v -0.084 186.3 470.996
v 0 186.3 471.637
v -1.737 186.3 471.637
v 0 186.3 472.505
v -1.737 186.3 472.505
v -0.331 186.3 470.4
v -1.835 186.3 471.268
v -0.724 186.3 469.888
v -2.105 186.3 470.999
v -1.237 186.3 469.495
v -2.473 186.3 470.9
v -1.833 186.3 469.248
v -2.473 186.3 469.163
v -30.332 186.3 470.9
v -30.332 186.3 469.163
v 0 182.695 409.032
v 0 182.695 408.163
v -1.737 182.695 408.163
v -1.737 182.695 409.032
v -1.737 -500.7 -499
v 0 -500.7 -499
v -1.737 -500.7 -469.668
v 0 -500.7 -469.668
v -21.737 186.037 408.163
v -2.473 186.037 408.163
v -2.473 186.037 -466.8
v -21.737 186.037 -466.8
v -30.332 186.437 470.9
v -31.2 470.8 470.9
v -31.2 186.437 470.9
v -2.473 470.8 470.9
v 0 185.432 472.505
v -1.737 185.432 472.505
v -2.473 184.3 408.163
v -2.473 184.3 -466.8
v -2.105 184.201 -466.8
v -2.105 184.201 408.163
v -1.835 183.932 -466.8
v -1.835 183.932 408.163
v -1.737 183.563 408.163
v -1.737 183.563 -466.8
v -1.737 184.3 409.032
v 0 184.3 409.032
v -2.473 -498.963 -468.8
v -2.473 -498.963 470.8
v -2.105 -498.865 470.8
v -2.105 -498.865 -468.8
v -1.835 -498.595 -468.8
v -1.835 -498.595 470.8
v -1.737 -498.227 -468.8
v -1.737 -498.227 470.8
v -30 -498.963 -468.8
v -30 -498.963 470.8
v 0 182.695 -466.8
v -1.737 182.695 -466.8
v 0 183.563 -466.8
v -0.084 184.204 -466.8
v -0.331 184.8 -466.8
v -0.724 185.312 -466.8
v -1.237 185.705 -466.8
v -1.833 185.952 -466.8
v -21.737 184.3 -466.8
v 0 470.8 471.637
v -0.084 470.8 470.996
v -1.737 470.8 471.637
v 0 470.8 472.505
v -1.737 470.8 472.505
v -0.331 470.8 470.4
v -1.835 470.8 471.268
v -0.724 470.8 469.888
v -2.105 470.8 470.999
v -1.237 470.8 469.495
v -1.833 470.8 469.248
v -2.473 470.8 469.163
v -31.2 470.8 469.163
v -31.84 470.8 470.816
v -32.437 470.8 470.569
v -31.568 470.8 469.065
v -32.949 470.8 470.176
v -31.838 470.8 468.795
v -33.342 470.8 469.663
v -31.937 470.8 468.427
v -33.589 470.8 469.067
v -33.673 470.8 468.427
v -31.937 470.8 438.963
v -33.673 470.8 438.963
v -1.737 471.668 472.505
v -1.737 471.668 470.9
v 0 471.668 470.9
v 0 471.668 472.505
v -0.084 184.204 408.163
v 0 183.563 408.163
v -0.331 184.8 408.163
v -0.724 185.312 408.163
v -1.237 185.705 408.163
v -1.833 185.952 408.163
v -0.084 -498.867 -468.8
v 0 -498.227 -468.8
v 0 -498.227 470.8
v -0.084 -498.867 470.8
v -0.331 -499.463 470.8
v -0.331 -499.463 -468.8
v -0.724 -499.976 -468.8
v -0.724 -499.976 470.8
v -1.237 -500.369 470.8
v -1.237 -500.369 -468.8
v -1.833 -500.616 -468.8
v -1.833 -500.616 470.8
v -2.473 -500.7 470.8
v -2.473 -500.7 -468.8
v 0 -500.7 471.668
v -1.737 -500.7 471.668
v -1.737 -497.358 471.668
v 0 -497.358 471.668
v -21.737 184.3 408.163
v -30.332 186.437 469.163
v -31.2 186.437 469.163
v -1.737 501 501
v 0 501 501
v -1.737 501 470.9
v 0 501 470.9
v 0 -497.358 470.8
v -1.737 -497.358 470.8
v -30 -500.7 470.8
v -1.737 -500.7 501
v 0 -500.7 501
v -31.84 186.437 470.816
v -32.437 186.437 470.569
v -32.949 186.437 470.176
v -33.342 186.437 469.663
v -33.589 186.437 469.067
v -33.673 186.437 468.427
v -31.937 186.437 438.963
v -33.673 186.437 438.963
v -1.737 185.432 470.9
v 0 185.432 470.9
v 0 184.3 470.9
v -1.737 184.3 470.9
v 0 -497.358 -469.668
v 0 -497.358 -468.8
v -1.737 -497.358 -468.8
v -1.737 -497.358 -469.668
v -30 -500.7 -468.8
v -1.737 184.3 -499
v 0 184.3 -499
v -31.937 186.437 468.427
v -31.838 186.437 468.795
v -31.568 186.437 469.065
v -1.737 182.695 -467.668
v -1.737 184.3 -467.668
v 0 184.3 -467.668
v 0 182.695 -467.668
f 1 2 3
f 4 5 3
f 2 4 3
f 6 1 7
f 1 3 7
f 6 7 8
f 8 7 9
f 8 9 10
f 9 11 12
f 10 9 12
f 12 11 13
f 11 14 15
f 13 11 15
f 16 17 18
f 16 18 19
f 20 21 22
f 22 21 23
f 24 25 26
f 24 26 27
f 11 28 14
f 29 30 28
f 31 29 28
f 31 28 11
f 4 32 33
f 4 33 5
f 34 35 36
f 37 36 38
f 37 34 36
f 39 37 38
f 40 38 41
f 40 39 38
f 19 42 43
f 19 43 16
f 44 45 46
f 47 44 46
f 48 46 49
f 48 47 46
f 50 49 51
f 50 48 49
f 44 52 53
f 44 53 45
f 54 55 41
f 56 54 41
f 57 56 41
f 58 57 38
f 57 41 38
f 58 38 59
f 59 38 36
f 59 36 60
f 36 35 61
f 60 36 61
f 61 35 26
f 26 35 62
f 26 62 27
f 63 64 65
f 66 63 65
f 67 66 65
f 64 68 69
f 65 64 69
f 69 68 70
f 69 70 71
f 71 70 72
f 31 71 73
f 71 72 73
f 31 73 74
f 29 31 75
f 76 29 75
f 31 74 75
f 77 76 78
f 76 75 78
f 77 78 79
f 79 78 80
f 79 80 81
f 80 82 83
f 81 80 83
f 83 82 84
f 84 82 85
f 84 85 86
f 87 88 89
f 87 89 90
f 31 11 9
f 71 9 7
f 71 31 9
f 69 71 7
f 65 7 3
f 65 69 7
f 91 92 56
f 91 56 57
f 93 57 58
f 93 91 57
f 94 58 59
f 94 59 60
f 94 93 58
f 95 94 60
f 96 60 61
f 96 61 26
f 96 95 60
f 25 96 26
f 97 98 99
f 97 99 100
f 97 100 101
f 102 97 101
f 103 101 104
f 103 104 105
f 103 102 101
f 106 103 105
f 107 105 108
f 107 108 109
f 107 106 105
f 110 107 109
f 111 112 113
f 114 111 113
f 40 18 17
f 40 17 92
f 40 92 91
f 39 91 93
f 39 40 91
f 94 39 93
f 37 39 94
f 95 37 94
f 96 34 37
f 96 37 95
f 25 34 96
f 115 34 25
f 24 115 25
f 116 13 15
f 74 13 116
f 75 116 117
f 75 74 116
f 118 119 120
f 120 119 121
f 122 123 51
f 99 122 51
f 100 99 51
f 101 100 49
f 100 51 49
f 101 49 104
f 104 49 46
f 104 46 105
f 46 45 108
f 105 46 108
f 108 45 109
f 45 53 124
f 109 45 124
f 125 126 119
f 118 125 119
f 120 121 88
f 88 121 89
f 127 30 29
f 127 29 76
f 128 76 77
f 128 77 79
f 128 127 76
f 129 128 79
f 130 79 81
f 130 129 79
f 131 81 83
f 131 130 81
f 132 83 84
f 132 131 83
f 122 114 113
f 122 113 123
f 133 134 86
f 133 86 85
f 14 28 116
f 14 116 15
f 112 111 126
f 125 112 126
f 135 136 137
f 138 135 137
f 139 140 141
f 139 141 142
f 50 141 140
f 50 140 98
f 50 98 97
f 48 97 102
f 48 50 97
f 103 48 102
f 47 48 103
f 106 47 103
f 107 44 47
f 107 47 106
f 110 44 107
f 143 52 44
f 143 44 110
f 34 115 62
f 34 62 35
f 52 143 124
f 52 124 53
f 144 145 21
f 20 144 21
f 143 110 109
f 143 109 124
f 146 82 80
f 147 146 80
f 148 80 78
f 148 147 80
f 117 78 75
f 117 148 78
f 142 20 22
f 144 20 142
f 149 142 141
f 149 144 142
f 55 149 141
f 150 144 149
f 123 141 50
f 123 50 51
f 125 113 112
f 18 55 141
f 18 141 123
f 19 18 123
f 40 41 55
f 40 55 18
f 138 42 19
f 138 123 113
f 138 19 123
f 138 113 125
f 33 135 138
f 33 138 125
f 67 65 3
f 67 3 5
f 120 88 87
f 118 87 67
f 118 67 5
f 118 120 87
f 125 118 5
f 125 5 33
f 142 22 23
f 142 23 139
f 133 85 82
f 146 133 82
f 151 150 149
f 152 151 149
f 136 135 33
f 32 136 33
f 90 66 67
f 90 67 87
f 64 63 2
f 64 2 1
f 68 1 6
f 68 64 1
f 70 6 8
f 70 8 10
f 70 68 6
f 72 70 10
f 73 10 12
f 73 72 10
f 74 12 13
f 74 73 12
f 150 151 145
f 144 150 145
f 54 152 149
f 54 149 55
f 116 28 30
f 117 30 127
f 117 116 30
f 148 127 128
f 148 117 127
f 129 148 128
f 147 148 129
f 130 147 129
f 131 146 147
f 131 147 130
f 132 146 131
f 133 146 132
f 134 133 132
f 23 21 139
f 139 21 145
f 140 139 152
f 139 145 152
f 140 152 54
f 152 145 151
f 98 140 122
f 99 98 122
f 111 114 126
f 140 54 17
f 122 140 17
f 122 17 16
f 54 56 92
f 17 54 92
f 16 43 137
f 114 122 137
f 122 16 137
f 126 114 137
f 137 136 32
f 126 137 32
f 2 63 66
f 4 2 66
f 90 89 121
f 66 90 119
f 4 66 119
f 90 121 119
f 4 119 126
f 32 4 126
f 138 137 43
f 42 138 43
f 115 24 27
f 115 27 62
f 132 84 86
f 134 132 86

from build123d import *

# Parameters (mm, degrees)
BASE_FLANGE2_DEPTH            = 1.7366
EDGE_FLANGE5_STRIP_W          = 8.4196
EDGE_FLANGE5_STRIP_H          = 1.7366
EDGE_FLANGE5_STRIP_CUT_DEPTH  = 939.6
EDGE_FLANGE5_RELIEF_W         = 9.2879
EDGE_FLANGE5_RELIEF_H         = 0.8683
EDGE_FLANGE5_RELIEF_CUT_DEPTH = 1.7366
EDGE_FLANGE5_DEPTH            = 939.6
EDGE_FLANGE6_STRIP_W          = 8.4196
EDGE_FLANGE6_STRIP_H          = 1.7366
EDGE_FLANGE6_STRIP_CUT_DEPTH  = 284.5
EDGE_FLANGE6_RELIEF_W         = 9.2879
EDGE_FLANGE6_RELIEF_H         = 0.8683
EDGE_FLANGE6_RELIEF_CUT_DEPTH = 1.7366
EDGE_FLANGE6_DEPTH            = 284.5
EDGE_FLANGE8_STRIP_W          = 8.4196
EDGE_FLANGE8_STRIP_H          = 1.7366
EDGE_FLANGE8_STRIP_CUT_DEPTH  = 874.9634
EDGE_FLANGE8_RELIEF_W         = 9.2879
EDGE_FLANGE8_RELIEF_H         = 0.8683
EDGE_FLANGE8_RELIEF_CUT_DEPTH = 1.7366
EDGE_FLANGE8_DEPTH            = 874.9634
EDGE_FLANGE9_STRIP_W          = 8.4196
EDGE_FLANGE9_STRIP_H          = 1.7366
EDGE_FLANGE9_STRIP_CUT_DEPTH  = 284.3634
EDGE_FLANGE9_RELIEF_W         = 9.2879
EDGE_FLANGE9_RELIEF_H         = 0.8683
EDGE_FLANGE9_RELIEF_CUT_DEPTH = 1.7366
EDGE_FLANGE9_DEPTH            = 284.3634


# Sheet-metal steps are written as plain solids
with BuildPart() as part:
    # Sketch10 → Base-Flange2 (new body)
    with BuildSketch(Plane(origin=(0, 0, 0), x_dir=(0, 0, -1), z_dir=(1, 0, 0))):
        Polygon((-470.9, 501), (-470.9, 184.3), (499, 184.3), (499, -500.7), (-501, -500.7), (-501, 501), align=None)
    extrude(amount=-BASE_FLANGE2_DEPTH)

    # Edge-Flange5 strip (across the edge) → Edge-Flange5 strip cut (cut)
    with BuildSketch(Plane(origin=(-1.7366, -500.7, -468.8), x_dir=(0, 1, 0), z_dir=(0, 0, 1))):
        with Locations((-1.7366, -0.8683)):
            Rectangle(EDGE_FLANGE5_STRIP_W, EDGE_FLANGE5_STRIP_H)
    extrude(amount=EDGE_FLANGE5_STRIP_CUT_DEPTH, mode=Mode.SUBTRACT)

    # Edge-Flange5 relief (on the sheet) → Edge-Flange5 relief cut (cut)
    with BuildSketch(Plane(origin=(-1.7366, -498.2268, -468.8), x_dir=(0, 1, 0), z_dir=(-1, 0, 0))):
        with Locations((-3.77565, 0.43415)):
            Rectangle(EDGE_FLANGE5_RELIEF_W, EDGE_FLANGE5_RELIEF_H)
        with Locations((-3.77565, -940.03415)):
            Rectangle(EDGE_FLANGE5_RELIEF_W, EDGE_FLANGE5_RELIEF_H)
    extrude(amount=-EDGE_FLANGE5_RELIEF_CUT_DEPTH, mode=Mode.SUBTRACT)

    # Edge-Flange5 section (across the edge) → Edge-Flange5 (add)
    with BuildSketch(Plane(origin=(-1.7366, -500.7, -468.8), x_dir=(0, 1, 0), z_dir=(0, 0, 1))):
        with BuildLine():
            Line((0, 0.7366), (0, 28.2634))
            Line((0, 28.2634), (1.7366, 28.2634))
            Line((1.7366, 28.2634), (1.7366, 0.7366))
            ThreePointArc((1.7366, 0.7366), (1.952345145, 0.215745145), (2.4732, 0))
            Line((2.4732, 0), (2.4732, -1.7366))
            ThreePointArc((2.4732, -1.7366), (0.724383509, -1.012216491), (0, 0.7366))
        make_face()
    extrude(amount=EDGE_FLANGE5_DEPTH)

    # Edge-Flange6 strip (across the edge) → Edge-Flange6 strip cut (cut)
    with BuildSketch(Plane(origin=(-1.7366, 470.8, 470.9), x_dir=(0, 0, 1), z_dir=(0, -1, 0))):
        with Locations((-3.4732, -0.8683)):
            Rectangle(EDGE_FLANGE6_STRIP_W, EDGE_FLANGE6_STRIP_H)
    extrude(amount=EDGE_FLANGE6_STRIP_CUT_DEPTH, mode=Mode.SUBTRACT)

    # Edge-Flange6 relief (on the sheet) → Edge-Flange6 relief cut (cut)
    with BuildSketch(Plane(origin=(-1.7366, 470.8, 471.6366), x_dir=(0, 0, 1), z_dir=(-1, 0, 0))):
        with Locations((-3.77565, 0.43415)):
            Rectangle(EDGE_FLANGE6_RELIEF_W, EDGE_FLANGE6_RELIEF_H)
        with Locations((-3.77565, -284.93415)):
            Rectangle(EDGE_FLANGE6_RELIEF_W, EDGE_FLANGE6_RELIEF_H)
    extrude(amount=-EDGE_FLANGE6_RELIEF_CUT_DEPTH, mode=Mode.SUBTRACT)

    # Edge-Flange6 section (across the edge) → Edge-Flange6 (add)
    with BuildSketch(Plane(origin=(-1.7366, 470.8, 470.9), x_dir=(0, 0, 1), z_dir=(0, -1, 0))):
        with BuildLine():
            Line((-1.7366, 0.7366), (-1.7366, 30.2))
            Line((-1.7366, 30.2), (0, 30.2))
            Line((0, 30.2), (0, 0.7366))
            ThreePointArc((0, 0.7366), (0.215745145, 0.215745145), (0.7366, 0))
            Line((0.7366, 0), (0.7366, -1.7366))
            ThreePointArc((0.7366, -1.7366), (-1.012216491, -1.012216491), (-1.7366, 0.7366))
        make_face()
    extrude(amount=EDGE_FLANGE6_DEPTH)

    # Edge-Flange8 strip (across the edge) → Edge-Flange8 strip cut (cut)
    with BuildSketch(Plane(origin=(-1.7366, 184.3, 408.1634), x_dir=(0, -1, 0), z_dir=(0, 0, -1))):
        with Locations((-3.4732, -0.8683)):
            Rectangle(EDGE_FLANGE8_STRIP_W, EDGE_FLANGE8_STRIP_H)
    extrude(amount=EDGE_FLANGE8_STRIP_CUT_DEPTH, mode=Mode.SUBTRACT)

    # Edge-Flange8 relief (on the sheet) → Edge-Flange8 relief cut (cut)
    with BuildSketch(Plane(origin=(-1.7366, 183.5634, 408.1634), x_dir=(0, -1, 0), z_dir=(-1, 0, 0))):
        with Locations((-3.77565, 0.43415)):
            Rectangle(EDGE_FLANGE8_RELIEF_W, EDGE_FLANGE8_RELIEF_H)
        with Locations((-3.77565, -875.39755)):
            Rectangle(EDGE_FLANGE8_RELIEF_W, EDGE_FLANGE8_RELIEF_H)
    extrude(amount=-EDGE_FLANGE8_RELIEF_CUT_DEPTH, mode=Mode.SUBTRACT)

    # Edge-Flange8 section (across the edge) → Edge-Flange8 (add)
    with BuildSketch(Plane(origin=(-1.7366, 184.3, 408.1634), x_dir=(0, -1, 0), z_dir=(0, 0, -1))):
        with BuildLine():
            Line((-1.7366, 0.7366), (-1.7366, 20))
            Line((-1.7366, 20), (0, 20))
            Line((0, 20), (0, 0.7366))
            ThreePointArc((0, 0.7366), (0.215745145, 0.215745145), (0.7366, 0))
            Line((0.7366, 0), (0.7366, -1.7366))
            ThreePointArc((0.7366, -1.7366), (-1.012216491, -1.012216491), (-1.7366, 0.7366))
        make_face()
    extrude(amount=EDGE_FLANGE8_DEPTH)

    # Edge-Flange9 strip (across the edge) → Edge-Flange9 strip cut (cut)
    with BuildSketch(Plane(origin=(-31.9366, 186.4366, 469.1634), x_dir=(1, 0, 0), z_dir=(0, 1, 0))):
        with Locations((-3.4732, -0.8683)):
            Rectangle(EDGE_FLANGE9_STRIP_W, EDGE_FLANGE9_STRIP_H)
    extrude(amount=EDGE_FLANGE9_STRIP_CUT_DEPTH, mode=Mode.SUBTRACT)

    # Edge-Flange9 relief (on the sheet) → Edge-Flange9 relief cut (cut)
    with BuildSketch(Plane(origin=(-31.2, 186.4366, 469.1634), x_dir=(1, 0, 0), z_dir=(0, 0, -1))):
        with Locations((-3.77565, 0.43415)):
            Rectangle(EDGE_FLANGE9_RELIEF_W, EDGE_FLANGE9_RELIEF_H)
    extrude(amount=-EDGE_FLANGE9_RELIEF_CUT_DEPTH, mode=Mode.SUBTRACT)

    # Edge-Flange9 section (across the edge) → Edge-Flange9 (add)
    with BuildSketch(Plane(origin=(-31.9366, 186.4366, 469.1634), x_dir=(1, 0, 0), z_dir=(0, 1, 0))):
        with BuildLine():
            Line((-1.7366, 0.7366), (-1.7366, 30.2))
            Line((-1.7366, 30.2), (0, 30.2))
            Line((0, 30.2), (0, 0.7366))
            ThreePointArc((0, 0.7366), (0.215745145, 0.215745145), (0.7366, 0))
            Line((0.7366, 0), (0.7366, -1.7366))
            ThreePointArc((0.7366, -1.7366), (-1.012216491, -1.012216491), (-1.7366, 0.7366))
        make_face()
    extrude(amount=EDGE_FLANGE9_DEPTH)


solid = part.part
